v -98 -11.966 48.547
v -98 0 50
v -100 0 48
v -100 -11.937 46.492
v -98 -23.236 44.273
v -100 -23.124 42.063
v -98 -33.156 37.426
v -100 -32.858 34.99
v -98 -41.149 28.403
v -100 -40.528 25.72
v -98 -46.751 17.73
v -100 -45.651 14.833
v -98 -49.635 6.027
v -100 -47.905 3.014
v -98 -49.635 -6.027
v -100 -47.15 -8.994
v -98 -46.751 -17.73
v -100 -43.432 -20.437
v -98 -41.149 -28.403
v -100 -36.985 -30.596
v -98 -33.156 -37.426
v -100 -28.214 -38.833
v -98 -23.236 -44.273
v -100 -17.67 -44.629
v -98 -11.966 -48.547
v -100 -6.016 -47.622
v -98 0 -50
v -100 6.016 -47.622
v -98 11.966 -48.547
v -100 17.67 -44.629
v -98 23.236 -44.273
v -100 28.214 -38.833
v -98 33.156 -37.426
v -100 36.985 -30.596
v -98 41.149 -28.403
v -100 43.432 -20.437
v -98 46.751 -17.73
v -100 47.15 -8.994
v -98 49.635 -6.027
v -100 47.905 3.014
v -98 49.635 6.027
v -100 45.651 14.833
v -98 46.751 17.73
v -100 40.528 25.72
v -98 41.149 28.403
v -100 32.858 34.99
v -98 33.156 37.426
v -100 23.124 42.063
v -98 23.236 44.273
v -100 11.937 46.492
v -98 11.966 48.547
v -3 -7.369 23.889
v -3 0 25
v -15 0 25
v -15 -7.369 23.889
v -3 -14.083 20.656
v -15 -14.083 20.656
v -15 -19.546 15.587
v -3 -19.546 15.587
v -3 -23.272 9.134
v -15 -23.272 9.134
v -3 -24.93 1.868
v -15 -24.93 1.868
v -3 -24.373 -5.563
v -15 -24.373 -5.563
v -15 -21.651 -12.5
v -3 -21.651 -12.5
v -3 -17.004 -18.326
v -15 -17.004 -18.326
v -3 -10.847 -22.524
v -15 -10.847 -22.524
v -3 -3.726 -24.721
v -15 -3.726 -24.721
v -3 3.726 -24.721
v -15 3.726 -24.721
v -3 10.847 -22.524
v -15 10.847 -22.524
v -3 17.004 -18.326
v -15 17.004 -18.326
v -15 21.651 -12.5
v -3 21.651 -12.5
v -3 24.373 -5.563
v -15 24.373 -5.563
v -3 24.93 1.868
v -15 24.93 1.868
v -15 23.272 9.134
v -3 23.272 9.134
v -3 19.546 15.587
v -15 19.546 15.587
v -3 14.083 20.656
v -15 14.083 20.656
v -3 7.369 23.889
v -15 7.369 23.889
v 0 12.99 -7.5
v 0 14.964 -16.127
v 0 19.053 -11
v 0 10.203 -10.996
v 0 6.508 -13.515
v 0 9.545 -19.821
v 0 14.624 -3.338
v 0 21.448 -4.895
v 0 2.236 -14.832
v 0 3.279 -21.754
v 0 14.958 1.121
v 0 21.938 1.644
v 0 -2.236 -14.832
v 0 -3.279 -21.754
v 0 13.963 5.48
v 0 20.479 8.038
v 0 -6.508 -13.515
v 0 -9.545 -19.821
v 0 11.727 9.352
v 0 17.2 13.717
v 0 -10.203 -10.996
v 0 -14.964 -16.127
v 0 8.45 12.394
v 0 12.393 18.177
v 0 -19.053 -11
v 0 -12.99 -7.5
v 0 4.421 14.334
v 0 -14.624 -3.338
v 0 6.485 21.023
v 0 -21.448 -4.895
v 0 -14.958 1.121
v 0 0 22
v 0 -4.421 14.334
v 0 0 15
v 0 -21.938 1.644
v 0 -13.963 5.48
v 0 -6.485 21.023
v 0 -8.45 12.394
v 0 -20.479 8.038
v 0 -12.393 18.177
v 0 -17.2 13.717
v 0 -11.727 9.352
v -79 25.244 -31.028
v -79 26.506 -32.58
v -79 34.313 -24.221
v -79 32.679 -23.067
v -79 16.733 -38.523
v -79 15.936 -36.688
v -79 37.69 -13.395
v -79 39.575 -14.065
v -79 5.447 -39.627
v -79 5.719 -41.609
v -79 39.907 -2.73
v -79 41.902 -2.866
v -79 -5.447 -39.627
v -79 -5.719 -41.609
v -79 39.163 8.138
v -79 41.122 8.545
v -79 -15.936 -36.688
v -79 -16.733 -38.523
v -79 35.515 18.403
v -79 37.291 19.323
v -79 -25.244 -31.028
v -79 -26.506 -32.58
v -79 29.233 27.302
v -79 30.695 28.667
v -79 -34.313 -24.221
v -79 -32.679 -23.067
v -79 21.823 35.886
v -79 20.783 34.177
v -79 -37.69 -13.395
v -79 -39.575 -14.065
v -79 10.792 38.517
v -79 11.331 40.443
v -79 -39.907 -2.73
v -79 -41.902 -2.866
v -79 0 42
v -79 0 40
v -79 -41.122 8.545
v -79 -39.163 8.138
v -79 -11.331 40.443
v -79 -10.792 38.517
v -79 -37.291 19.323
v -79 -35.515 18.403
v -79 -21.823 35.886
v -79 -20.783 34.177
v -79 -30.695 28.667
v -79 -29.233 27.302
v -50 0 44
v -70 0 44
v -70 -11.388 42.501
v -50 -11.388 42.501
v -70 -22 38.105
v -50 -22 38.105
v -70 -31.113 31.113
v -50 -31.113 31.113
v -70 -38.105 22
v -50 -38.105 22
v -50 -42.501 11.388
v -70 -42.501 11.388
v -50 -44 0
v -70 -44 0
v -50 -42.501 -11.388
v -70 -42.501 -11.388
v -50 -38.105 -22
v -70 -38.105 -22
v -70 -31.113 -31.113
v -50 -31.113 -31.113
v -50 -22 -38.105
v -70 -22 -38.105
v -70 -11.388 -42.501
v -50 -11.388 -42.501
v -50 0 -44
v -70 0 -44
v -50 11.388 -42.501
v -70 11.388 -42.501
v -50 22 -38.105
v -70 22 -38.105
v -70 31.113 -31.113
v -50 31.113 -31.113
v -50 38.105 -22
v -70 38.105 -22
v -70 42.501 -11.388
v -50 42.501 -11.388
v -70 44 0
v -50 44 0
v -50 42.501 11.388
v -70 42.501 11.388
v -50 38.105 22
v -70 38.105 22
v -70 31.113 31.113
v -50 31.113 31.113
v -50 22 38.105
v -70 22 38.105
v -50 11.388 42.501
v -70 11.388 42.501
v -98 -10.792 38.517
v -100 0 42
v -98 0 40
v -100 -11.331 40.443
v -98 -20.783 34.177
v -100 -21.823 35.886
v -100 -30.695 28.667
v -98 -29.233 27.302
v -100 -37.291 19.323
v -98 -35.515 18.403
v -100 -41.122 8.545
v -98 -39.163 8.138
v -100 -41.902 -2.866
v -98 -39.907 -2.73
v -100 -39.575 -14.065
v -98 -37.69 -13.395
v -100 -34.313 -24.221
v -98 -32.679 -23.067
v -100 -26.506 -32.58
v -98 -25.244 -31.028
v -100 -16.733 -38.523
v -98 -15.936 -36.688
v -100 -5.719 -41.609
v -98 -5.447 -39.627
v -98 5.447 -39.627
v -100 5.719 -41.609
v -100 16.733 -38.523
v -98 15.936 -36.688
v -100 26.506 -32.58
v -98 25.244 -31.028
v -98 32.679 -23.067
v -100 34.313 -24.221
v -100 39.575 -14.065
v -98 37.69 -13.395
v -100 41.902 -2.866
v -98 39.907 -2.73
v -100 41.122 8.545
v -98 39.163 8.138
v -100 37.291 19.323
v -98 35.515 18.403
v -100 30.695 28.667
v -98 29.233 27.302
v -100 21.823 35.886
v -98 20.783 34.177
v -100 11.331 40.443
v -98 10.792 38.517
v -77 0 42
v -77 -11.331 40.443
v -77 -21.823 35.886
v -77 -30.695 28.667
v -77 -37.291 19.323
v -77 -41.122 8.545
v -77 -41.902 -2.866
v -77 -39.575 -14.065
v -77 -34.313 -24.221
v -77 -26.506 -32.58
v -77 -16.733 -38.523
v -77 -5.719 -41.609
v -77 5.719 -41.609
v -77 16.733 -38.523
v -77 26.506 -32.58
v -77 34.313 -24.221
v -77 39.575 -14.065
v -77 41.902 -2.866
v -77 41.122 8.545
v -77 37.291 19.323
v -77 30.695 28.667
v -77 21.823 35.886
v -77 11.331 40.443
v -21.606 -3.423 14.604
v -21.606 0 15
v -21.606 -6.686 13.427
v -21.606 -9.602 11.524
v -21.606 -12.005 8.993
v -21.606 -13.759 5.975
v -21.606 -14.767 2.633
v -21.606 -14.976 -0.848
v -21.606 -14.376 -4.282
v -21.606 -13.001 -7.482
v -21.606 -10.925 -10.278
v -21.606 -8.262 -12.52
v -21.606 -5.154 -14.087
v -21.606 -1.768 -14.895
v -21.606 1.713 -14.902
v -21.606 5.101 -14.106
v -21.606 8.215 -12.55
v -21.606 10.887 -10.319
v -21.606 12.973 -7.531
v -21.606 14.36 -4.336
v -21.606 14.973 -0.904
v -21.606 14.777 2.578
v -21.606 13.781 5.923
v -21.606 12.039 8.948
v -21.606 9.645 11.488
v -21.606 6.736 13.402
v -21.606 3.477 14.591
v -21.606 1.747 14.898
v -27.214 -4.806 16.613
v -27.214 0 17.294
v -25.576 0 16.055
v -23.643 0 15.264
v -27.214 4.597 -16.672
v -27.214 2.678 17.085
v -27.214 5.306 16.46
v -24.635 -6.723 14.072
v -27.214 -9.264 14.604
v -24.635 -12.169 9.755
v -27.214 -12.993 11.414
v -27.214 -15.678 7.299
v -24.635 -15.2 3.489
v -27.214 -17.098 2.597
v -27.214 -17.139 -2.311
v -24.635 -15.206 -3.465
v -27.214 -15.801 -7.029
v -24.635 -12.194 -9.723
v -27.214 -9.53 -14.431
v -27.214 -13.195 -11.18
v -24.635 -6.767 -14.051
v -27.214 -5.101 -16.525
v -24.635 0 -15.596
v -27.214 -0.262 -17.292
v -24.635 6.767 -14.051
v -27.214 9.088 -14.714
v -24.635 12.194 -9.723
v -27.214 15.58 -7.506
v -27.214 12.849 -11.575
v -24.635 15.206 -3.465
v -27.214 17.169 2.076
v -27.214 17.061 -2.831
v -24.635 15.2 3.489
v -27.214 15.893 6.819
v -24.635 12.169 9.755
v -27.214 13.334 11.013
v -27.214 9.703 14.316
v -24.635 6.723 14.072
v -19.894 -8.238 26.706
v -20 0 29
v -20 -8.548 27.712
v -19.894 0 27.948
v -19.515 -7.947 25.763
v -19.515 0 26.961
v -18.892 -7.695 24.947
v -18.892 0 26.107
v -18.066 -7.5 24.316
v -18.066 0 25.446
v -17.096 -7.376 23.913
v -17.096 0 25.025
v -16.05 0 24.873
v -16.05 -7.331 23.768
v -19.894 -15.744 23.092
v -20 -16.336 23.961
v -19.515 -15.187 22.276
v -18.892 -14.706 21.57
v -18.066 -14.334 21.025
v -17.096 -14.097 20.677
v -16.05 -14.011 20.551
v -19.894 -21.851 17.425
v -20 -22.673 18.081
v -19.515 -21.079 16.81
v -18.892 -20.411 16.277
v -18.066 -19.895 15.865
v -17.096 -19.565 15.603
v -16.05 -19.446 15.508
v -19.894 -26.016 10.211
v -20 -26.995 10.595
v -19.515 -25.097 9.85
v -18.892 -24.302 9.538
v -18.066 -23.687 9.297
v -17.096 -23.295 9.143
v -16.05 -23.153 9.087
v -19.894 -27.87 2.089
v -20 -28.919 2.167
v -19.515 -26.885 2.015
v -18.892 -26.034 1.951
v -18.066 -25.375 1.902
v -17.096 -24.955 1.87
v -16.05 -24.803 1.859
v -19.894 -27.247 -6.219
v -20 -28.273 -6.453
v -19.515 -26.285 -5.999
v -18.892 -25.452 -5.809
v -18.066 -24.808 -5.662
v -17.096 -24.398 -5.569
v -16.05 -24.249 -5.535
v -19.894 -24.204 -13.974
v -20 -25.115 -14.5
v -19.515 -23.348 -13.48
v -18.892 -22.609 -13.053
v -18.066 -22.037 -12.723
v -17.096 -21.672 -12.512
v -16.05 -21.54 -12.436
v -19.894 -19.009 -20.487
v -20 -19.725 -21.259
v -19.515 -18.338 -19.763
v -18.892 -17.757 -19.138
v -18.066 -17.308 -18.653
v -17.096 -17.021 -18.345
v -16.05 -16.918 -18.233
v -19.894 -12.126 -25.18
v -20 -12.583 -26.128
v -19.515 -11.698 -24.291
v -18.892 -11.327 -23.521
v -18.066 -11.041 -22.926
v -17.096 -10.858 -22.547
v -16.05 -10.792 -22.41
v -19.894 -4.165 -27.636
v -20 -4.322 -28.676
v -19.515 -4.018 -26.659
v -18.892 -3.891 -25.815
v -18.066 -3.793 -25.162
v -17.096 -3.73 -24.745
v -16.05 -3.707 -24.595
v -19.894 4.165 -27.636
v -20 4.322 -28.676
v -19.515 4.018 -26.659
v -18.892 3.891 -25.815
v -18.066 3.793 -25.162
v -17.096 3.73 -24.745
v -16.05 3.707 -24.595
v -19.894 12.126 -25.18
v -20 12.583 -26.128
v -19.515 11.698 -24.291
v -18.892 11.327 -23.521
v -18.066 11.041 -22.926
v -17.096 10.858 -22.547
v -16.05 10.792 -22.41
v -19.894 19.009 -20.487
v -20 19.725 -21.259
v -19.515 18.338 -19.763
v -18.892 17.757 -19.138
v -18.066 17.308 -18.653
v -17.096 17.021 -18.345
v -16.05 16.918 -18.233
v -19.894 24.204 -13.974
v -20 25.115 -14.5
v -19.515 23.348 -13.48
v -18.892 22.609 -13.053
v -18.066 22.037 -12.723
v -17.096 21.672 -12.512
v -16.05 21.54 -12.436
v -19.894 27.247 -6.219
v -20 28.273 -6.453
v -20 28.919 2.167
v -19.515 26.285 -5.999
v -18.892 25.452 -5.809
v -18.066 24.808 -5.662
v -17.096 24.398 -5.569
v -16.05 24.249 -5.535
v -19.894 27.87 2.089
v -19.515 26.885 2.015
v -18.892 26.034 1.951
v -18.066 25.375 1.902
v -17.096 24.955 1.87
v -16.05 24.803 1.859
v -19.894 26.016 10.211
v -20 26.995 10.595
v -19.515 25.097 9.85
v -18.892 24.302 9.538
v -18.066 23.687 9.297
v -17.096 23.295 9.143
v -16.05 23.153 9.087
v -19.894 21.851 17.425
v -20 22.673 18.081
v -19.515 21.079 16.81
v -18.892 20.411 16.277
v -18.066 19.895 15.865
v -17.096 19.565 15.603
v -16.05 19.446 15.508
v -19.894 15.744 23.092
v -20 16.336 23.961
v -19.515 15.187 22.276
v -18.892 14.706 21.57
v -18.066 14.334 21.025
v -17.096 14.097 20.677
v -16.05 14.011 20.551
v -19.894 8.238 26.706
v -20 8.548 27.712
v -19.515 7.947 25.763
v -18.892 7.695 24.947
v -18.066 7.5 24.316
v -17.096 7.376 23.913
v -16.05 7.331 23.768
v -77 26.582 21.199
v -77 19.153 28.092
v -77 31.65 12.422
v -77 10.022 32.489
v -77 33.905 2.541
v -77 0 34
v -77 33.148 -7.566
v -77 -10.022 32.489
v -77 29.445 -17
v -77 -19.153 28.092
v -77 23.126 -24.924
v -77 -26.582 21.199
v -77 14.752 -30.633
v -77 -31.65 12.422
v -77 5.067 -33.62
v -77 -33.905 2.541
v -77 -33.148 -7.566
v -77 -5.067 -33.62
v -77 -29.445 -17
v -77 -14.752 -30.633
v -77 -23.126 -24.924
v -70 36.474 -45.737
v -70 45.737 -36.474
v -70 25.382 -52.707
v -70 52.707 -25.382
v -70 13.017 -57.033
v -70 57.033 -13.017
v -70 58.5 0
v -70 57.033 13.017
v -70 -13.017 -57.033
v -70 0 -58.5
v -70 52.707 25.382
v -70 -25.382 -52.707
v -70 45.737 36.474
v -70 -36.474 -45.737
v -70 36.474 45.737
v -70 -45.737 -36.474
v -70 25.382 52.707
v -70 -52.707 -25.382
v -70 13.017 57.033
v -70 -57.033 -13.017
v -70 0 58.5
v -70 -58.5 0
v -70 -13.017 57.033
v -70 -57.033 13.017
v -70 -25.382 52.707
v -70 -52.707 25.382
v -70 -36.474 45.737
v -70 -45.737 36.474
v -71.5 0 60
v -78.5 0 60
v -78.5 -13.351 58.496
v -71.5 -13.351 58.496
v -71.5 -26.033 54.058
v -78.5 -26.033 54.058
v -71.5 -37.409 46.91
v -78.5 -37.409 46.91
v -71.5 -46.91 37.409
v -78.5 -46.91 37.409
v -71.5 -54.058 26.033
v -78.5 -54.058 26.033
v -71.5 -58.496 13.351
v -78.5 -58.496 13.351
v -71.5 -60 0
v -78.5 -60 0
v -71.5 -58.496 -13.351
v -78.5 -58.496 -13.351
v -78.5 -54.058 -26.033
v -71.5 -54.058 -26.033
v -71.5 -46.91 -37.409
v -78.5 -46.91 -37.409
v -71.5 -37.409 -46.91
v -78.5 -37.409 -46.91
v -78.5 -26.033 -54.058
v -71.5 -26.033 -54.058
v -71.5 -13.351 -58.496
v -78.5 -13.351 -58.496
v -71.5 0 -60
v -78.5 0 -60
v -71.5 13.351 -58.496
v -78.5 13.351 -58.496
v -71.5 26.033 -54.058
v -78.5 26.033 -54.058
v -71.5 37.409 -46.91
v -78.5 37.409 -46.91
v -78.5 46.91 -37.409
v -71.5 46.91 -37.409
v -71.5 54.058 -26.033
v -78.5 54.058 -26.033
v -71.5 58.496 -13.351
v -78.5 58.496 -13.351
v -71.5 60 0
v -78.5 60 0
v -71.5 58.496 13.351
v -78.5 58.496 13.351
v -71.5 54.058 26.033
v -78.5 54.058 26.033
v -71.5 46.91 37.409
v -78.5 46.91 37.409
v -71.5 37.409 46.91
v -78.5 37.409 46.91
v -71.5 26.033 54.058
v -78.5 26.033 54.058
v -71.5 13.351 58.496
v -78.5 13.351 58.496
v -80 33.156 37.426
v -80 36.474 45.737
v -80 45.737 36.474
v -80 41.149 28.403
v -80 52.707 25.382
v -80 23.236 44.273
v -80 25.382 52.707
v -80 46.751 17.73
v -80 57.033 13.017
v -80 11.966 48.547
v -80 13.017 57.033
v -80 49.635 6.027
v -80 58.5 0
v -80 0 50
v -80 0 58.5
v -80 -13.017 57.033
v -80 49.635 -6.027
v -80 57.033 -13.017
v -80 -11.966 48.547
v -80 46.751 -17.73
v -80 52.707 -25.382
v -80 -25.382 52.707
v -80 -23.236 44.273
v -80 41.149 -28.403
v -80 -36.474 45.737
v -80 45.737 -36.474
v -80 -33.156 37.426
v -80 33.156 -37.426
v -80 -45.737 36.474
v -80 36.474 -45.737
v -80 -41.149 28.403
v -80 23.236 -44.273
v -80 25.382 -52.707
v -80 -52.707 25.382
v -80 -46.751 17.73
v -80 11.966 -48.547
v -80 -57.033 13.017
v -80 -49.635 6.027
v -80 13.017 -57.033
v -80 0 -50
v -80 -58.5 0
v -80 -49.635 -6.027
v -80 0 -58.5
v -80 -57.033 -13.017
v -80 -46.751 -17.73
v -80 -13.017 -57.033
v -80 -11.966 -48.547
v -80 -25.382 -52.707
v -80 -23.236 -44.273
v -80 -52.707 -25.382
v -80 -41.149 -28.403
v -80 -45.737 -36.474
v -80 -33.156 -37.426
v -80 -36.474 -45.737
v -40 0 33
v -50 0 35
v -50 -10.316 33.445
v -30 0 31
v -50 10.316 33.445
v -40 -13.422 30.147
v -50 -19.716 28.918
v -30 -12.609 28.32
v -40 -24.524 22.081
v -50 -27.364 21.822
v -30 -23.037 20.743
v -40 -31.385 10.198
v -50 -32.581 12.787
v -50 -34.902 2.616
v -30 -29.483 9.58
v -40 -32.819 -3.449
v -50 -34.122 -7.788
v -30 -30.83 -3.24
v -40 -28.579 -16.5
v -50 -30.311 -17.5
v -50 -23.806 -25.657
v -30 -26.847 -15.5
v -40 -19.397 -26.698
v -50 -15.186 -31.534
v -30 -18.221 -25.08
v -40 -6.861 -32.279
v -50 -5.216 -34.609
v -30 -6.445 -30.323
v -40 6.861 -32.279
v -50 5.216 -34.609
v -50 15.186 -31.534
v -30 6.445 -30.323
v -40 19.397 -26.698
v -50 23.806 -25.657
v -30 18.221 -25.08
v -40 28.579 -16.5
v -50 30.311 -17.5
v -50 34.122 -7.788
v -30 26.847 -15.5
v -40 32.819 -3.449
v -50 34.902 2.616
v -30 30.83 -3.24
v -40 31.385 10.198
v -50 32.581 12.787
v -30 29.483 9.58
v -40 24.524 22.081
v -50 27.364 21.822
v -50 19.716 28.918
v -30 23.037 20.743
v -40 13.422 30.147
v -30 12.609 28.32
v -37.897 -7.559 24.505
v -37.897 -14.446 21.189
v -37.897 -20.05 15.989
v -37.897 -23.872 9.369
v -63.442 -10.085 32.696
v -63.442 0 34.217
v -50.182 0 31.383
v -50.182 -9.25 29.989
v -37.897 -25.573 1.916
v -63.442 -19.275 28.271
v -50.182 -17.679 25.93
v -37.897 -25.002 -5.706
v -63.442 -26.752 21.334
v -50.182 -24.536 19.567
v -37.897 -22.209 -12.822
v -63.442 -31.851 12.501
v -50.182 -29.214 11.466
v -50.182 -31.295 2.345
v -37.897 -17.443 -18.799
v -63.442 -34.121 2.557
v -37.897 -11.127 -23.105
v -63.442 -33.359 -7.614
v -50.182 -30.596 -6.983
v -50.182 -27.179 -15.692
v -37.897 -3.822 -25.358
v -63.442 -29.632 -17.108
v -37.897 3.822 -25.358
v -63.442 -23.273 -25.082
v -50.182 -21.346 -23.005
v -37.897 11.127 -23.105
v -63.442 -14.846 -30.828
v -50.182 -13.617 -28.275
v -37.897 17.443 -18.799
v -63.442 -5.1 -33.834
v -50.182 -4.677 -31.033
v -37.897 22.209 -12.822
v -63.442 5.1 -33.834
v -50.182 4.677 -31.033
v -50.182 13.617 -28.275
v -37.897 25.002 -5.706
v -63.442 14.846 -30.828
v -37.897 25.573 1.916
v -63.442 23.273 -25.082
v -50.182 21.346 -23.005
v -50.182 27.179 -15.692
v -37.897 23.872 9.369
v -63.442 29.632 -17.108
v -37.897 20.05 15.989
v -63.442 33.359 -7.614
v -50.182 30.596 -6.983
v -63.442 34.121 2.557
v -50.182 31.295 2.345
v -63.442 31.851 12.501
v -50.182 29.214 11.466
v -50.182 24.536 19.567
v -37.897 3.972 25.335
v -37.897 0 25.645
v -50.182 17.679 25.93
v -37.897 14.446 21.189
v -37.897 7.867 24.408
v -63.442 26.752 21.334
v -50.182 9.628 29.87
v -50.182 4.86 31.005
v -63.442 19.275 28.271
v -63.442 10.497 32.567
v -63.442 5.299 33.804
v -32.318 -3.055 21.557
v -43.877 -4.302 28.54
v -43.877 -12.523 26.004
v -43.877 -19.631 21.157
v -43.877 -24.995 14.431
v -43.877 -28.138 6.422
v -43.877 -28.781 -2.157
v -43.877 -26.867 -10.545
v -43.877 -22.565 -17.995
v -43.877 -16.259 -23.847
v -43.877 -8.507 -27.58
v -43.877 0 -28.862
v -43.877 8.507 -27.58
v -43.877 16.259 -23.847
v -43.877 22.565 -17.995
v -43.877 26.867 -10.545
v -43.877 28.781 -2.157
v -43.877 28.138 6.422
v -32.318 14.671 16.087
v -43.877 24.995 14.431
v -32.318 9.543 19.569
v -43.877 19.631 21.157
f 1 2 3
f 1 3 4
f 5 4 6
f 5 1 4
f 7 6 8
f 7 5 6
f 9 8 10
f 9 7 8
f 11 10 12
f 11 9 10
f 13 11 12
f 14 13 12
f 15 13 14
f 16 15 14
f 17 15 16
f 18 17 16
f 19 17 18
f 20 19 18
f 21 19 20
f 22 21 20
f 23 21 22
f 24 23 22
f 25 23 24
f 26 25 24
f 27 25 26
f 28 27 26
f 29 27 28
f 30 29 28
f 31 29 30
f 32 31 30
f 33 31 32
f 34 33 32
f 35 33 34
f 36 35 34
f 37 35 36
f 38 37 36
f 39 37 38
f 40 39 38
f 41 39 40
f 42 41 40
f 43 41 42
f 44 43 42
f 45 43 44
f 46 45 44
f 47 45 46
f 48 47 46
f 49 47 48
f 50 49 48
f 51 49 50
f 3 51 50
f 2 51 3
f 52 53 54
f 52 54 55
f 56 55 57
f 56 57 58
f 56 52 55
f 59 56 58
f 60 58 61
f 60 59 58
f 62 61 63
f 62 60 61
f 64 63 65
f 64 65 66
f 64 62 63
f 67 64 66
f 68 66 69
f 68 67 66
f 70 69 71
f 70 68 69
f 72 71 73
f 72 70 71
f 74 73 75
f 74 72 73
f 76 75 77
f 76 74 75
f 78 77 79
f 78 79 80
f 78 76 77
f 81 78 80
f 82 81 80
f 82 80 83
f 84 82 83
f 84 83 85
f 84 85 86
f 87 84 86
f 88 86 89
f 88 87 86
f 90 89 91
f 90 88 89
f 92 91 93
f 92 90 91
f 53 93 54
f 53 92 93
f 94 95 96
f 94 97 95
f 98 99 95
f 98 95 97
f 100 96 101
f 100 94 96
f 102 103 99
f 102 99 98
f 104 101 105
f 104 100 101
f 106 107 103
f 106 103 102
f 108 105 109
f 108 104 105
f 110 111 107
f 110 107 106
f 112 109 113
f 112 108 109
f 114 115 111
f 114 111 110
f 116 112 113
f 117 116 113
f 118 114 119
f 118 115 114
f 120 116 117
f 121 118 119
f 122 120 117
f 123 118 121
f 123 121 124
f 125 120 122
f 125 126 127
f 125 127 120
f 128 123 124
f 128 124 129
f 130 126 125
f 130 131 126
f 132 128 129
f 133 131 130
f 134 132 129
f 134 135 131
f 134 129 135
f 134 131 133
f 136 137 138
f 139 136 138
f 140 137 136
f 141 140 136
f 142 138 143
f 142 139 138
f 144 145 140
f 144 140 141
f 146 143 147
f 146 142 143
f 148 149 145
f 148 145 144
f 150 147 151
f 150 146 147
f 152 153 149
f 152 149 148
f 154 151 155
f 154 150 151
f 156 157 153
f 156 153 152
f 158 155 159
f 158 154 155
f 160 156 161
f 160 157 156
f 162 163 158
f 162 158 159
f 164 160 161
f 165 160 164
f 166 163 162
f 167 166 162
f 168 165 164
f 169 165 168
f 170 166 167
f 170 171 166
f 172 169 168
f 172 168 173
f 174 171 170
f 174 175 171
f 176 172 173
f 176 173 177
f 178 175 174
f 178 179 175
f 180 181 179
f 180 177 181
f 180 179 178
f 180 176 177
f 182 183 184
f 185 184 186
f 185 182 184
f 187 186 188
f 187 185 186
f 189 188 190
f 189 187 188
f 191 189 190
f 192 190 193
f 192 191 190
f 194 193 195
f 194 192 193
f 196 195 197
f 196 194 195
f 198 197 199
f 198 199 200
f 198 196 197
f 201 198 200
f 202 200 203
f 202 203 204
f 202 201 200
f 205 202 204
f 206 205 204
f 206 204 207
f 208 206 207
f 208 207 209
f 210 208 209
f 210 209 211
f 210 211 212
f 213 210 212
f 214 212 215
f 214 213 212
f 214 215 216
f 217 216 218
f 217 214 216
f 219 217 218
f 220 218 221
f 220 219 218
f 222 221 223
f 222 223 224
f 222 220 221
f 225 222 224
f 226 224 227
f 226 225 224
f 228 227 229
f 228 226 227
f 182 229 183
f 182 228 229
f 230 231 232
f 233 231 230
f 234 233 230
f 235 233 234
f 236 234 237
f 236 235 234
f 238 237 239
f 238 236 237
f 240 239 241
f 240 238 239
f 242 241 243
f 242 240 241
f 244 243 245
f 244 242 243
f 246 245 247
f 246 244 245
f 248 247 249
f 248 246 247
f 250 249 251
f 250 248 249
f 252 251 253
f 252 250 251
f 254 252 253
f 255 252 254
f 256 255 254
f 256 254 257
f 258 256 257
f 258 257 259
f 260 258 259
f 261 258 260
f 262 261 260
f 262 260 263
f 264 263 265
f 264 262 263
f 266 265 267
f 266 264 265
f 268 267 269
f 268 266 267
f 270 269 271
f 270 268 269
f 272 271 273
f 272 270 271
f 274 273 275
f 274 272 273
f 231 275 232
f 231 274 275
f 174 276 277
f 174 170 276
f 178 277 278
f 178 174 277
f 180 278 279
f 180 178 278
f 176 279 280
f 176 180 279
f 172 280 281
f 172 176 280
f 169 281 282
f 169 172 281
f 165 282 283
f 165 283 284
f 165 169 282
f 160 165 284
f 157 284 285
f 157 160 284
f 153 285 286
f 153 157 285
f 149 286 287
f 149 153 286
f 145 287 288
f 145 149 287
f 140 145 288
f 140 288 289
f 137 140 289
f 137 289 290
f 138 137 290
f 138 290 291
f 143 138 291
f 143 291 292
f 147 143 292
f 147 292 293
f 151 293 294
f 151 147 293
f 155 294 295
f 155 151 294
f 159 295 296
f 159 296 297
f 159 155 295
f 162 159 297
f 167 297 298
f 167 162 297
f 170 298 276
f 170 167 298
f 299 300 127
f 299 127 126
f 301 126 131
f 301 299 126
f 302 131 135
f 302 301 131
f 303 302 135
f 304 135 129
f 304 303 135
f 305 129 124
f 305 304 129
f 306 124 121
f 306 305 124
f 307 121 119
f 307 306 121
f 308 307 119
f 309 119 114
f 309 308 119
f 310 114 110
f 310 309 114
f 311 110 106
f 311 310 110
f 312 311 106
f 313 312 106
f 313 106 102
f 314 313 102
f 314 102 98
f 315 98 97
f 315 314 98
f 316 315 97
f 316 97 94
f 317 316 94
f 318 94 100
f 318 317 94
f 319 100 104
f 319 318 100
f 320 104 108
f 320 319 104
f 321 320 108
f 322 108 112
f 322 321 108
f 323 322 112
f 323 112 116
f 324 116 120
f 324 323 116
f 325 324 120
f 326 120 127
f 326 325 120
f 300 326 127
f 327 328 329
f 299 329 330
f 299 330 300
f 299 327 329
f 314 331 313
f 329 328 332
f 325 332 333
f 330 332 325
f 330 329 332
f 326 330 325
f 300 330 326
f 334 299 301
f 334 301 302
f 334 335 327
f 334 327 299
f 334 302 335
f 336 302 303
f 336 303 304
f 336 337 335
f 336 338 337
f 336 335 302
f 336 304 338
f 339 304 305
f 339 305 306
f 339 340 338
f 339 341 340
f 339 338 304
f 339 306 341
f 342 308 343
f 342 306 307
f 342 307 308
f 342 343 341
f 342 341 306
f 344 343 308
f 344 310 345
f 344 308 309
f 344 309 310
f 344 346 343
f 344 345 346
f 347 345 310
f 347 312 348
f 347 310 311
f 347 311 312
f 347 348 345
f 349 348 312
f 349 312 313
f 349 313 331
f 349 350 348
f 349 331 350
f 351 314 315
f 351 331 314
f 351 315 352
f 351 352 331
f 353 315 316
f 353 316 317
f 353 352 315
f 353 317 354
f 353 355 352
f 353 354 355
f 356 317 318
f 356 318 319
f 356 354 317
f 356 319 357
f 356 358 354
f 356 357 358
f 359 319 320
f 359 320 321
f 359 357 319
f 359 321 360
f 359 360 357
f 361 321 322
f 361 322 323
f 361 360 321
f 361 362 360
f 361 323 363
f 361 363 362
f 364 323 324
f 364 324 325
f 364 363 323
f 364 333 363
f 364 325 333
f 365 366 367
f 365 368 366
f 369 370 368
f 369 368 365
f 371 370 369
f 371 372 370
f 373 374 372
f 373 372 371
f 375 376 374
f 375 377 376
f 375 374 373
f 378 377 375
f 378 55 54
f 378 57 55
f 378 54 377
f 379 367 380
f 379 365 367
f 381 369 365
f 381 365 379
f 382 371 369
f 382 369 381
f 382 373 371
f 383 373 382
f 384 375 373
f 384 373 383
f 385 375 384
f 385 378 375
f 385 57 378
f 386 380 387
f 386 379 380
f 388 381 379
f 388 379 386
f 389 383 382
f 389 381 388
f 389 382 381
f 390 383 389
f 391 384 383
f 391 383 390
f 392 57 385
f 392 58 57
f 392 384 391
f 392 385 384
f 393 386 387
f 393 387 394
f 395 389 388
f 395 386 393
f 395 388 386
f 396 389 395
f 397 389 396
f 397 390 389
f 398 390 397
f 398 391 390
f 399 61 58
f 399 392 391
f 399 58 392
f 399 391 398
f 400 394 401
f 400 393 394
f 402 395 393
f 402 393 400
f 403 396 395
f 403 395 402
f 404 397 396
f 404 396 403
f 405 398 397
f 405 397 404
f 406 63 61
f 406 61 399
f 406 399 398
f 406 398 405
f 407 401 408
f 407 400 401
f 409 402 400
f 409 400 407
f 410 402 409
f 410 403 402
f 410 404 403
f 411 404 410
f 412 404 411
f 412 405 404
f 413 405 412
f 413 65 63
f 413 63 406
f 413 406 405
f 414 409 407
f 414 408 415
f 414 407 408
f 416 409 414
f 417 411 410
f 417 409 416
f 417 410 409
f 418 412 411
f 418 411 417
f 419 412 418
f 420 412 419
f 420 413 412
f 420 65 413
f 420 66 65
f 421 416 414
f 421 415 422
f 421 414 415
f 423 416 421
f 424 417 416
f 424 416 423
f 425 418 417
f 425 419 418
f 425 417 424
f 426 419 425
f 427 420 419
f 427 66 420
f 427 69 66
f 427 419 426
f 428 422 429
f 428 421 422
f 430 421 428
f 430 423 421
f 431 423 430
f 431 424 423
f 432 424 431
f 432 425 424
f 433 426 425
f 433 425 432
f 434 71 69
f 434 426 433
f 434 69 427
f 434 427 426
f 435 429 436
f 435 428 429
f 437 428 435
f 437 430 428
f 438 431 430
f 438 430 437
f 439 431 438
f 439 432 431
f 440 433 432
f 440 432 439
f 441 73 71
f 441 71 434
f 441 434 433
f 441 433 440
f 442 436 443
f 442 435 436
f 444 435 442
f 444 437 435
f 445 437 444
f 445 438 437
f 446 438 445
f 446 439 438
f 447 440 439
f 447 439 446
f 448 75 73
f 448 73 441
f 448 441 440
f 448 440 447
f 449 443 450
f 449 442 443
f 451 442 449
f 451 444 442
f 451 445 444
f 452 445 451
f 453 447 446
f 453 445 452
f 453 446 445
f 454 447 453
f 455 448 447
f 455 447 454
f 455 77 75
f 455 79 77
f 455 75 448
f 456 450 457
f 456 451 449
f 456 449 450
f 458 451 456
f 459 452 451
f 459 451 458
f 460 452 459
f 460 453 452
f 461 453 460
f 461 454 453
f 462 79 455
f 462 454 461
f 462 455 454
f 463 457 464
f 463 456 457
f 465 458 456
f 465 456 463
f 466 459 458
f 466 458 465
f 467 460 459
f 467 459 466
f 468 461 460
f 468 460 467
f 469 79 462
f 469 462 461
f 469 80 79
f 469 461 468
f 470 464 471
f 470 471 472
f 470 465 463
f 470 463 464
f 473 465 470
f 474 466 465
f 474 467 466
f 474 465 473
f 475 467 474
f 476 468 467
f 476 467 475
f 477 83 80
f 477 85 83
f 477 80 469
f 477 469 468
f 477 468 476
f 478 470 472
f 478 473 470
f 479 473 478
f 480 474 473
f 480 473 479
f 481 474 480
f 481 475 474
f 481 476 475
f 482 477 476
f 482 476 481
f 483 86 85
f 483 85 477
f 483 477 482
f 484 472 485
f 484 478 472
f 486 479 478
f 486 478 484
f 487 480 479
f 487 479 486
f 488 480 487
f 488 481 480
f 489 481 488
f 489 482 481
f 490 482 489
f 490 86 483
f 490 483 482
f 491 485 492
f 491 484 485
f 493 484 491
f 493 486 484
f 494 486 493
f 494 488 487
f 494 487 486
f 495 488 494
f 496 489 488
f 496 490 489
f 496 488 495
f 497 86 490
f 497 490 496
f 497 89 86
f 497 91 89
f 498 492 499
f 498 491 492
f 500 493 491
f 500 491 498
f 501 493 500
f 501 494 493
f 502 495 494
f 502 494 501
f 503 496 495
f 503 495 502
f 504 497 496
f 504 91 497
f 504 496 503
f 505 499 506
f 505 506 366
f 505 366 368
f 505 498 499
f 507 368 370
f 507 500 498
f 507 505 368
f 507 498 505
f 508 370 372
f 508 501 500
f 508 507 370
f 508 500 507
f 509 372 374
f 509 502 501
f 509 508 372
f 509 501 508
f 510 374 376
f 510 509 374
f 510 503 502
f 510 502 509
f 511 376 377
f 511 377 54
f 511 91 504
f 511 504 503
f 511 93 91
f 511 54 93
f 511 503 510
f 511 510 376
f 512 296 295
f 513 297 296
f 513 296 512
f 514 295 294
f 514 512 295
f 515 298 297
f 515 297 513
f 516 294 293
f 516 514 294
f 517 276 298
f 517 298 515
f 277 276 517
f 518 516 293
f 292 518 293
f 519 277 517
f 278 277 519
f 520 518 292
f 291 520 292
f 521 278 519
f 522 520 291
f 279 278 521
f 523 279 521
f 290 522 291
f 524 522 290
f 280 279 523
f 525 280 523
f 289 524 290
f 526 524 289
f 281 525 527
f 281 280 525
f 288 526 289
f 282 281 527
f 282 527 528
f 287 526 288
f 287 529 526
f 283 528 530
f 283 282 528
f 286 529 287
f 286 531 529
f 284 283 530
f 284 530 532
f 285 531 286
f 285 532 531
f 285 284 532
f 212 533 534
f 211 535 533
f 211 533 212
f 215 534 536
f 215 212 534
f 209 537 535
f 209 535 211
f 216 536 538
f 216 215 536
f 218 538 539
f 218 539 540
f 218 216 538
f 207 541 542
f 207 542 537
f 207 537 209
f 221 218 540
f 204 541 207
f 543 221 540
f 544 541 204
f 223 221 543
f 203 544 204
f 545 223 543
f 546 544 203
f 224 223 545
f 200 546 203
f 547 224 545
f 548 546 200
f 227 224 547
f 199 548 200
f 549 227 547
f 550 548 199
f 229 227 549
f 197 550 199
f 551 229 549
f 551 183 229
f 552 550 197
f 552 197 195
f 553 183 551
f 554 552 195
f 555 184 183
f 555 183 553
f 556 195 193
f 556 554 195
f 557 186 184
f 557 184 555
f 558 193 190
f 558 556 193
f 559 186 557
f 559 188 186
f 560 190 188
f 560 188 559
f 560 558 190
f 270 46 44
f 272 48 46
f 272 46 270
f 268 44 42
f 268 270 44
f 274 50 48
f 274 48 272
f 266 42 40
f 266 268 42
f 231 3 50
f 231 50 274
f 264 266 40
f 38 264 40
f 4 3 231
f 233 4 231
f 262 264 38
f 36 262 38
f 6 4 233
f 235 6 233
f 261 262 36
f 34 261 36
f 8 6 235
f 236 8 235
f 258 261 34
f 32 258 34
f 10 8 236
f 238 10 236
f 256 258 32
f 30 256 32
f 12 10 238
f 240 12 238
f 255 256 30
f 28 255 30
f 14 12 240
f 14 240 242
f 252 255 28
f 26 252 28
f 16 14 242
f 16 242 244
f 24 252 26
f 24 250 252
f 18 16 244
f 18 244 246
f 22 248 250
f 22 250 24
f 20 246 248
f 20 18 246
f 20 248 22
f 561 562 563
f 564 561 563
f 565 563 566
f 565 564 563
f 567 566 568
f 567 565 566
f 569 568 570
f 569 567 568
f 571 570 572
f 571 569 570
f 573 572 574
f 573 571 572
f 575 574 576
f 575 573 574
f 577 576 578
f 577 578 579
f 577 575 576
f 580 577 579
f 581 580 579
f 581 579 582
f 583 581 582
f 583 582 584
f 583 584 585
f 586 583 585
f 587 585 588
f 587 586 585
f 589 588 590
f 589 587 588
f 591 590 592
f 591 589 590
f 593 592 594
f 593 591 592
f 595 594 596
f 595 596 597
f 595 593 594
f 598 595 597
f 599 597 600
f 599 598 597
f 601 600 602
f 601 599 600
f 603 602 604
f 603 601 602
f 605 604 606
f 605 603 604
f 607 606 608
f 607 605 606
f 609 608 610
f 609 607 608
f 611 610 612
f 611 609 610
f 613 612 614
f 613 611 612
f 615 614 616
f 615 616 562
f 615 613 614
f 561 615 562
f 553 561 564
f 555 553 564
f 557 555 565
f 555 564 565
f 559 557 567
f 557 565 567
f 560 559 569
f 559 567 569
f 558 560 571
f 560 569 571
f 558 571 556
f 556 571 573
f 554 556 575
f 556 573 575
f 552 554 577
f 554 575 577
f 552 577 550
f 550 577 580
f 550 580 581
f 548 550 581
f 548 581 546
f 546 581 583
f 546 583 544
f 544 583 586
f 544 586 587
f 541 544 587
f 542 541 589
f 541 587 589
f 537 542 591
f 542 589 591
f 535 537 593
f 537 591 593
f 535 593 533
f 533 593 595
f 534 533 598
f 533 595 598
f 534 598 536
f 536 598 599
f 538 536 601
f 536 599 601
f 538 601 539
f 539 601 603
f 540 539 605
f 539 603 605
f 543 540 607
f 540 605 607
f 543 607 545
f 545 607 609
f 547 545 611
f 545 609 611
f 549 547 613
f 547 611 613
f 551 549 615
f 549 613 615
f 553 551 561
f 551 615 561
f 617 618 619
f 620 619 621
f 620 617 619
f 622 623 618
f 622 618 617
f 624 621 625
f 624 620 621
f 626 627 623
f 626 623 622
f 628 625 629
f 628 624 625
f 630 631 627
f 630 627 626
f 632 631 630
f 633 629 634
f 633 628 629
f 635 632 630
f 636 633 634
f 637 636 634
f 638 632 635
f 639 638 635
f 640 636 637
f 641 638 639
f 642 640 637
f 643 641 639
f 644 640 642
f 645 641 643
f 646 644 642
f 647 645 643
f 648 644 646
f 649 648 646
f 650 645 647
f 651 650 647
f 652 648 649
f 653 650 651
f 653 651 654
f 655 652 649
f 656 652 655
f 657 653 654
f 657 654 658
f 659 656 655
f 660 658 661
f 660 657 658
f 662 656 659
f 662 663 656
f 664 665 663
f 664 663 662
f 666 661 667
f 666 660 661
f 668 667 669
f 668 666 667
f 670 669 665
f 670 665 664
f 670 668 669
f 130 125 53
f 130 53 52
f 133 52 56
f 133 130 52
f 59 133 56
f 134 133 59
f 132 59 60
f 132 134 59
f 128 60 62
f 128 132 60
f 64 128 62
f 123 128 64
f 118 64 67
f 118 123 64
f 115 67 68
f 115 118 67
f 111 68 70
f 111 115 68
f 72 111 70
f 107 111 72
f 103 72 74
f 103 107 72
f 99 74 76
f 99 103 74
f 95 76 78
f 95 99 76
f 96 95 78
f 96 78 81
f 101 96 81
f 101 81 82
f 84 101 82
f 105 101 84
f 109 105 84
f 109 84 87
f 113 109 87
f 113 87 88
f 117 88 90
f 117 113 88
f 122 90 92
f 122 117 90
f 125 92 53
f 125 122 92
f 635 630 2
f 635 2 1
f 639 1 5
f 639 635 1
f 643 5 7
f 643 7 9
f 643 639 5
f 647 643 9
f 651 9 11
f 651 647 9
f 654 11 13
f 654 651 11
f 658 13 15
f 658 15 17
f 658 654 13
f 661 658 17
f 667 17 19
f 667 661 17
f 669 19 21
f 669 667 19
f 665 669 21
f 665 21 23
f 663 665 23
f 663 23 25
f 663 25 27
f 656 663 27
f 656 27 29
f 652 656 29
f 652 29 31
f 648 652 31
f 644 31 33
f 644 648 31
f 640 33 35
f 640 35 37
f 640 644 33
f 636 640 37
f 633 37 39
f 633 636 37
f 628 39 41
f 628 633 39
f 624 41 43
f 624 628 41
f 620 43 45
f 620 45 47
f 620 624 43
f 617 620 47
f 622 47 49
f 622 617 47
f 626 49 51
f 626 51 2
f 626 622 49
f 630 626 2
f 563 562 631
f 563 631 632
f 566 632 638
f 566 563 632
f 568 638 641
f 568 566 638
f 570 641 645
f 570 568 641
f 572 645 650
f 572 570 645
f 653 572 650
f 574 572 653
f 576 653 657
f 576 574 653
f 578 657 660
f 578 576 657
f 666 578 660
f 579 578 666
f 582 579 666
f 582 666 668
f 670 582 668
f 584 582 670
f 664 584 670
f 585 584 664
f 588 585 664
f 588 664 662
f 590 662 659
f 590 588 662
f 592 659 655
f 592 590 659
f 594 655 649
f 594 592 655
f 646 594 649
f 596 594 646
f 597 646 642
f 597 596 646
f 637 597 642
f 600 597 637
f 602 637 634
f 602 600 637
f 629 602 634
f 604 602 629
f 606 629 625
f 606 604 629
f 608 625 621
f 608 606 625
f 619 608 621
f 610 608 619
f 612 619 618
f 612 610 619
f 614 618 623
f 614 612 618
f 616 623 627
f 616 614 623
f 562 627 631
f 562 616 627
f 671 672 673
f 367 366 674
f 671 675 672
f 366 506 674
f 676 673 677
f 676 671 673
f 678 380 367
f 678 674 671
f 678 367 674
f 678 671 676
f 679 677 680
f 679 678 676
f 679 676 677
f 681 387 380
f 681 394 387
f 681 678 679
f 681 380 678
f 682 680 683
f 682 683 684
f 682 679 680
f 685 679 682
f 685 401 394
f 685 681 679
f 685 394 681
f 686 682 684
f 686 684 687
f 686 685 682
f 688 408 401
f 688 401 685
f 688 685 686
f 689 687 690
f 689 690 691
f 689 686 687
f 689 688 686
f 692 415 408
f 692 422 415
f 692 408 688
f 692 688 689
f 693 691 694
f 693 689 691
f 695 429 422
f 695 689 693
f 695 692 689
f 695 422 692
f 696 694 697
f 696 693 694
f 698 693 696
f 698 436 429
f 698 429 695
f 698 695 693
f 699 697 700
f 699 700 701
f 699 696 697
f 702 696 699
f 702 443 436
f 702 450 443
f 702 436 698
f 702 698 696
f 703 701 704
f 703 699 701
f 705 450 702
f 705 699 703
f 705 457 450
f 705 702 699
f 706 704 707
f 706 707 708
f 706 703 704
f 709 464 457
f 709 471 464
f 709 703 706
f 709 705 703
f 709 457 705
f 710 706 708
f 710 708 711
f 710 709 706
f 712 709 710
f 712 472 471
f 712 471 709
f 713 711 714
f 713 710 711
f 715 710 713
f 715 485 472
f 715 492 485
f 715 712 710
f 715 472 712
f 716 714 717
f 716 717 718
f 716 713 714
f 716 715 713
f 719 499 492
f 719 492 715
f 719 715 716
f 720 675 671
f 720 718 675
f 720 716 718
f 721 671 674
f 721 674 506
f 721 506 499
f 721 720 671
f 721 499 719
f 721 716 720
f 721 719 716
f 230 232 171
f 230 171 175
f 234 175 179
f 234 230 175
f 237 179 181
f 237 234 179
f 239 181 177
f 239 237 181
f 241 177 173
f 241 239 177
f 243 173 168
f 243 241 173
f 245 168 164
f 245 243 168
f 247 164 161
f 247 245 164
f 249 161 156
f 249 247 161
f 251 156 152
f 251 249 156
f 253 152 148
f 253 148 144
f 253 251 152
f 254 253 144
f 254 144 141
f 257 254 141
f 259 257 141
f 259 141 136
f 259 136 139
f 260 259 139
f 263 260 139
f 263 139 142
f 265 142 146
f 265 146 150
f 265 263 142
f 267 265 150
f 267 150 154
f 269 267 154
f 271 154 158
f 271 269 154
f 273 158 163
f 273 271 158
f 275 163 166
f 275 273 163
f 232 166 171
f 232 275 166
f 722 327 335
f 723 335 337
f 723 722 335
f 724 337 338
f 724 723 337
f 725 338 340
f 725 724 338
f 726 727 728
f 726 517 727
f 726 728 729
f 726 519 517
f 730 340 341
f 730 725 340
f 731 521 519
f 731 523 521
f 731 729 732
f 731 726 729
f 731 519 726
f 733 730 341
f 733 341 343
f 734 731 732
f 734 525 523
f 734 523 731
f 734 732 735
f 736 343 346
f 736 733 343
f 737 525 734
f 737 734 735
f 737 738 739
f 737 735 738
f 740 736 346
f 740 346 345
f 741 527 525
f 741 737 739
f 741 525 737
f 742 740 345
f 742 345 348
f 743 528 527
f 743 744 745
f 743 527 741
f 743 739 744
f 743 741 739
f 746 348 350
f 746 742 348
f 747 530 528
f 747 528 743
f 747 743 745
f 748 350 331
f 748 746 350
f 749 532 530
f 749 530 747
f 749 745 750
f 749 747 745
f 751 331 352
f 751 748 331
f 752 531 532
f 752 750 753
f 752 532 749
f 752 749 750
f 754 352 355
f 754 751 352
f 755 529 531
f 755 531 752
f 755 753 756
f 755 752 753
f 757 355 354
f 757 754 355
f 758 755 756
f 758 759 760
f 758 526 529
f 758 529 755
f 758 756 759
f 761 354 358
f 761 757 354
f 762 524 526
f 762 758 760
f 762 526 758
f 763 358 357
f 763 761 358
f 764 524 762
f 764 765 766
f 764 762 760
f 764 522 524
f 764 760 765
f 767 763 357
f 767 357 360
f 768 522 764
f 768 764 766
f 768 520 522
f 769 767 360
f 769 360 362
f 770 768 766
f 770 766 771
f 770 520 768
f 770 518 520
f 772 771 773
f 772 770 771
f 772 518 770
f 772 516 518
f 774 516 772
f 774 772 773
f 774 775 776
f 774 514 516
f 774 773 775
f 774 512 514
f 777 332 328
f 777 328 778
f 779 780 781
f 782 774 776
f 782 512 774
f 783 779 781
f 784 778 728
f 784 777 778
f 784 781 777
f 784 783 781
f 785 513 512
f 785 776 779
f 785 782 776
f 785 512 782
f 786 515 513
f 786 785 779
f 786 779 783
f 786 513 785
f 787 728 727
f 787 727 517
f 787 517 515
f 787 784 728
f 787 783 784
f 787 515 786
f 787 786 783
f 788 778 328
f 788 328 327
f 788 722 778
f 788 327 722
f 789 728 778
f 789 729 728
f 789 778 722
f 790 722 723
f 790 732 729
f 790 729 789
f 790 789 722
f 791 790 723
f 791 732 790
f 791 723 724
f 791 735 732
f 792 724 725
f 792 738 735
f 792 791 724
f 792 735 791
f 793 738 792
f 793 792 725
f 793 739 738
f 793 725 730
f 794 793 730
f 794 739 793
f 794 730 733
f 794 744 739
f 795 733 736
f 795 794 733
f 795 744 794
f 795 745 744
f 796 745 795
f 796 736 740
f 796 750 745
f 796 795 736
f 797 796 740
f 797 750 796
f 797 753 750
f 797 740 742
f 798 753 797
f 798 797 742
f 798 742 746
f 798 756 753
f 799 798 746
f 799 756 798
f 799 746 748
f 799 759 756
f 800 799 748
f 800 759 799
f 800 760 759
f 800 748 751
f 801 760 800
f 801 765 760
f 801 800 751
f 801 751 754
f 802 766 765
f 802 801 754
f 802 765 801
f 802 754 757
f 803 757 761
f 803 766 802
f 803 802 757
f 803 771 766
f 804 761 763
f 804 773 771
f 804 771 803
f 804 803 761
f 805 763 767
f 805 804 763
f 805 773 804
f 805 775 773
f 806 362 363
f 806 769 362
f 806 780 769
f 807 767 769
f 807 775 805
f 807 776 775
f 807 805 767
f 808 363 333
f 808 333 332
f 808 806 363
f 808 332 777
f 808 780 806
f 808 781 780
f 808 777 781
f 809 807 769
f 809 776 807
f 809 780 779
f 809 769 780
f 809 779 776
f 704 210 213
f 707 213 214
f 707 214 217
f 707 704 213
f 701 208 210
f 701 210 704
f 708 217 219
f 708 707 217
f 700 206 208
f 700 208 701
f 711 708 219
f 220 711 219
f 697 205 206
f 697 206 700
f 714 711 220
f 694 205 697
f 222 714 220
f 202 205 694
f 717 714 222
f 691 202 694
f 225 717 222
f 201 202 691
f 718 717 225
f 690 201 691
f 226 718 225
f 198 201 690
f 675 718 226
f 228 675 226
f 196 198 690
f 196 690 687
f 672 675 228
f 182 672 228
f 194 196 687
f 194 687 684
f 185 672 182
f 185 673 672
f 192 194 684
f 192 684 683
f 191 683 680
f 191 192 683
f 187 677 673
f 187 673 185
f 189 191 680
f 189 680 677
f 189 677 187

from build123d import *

# Parameters (mm, degrees)
SMUSSO1_SIZE = 2
RACCORDO1_R  = 8
SMUSSO2_SIZE = 1.5
SMUSSO3_SIZE = 3


with BuildPart() as part:
    # Schizzo1 → Rivoluzione1 (revolve)
    with BuildSketch(Plane.XY, mode=Mode.PRIVATE) as rivoluzione1_sk:
        with BuildLine():
            ThreePointArc((-25, 15), (-48.677605909, 30.856025933), (-77, 34))
            Line((-77, 34), (-77, 42))
            Line((-77, 42), (-79, 42))
            Line((-79, 42), (-79, 40))
            Line((-79, 40), (-100, 40))
            Line((-100, 40), (-100, 50))
            Line((-100, 50), (-80, 50))
            Line((-80, 50), (-80, 60))
            Line((-80, 60), (-70, 60))
            Line((-70, 60), (-70, 44))
            Line((-70, 44), (-50, 44))
            Line((-50, 44), (-50, 35))
            Line((-50, 35), (-20, 29))
            ThreePointArc((-20, 29), (-18.500814089, 25.748982388), (-15, 25))
            Line((-15, 25), (0, 25))
            Line((0, 25), (0, 15))
            Line((0, 15), (-25, 15))
        make_face()
    revolve(rivoluzione1_sk.sketch.rotate(Axis((-117.125626325, 0, 0), (1, 0, 0)), 90), axis=Axis((-117.125626325, 0, 0), (1, 0, 0)))

    # Smusso1
    smusso1_edges = [part.edges().sort_by_distance(p)[0] for p in [
        (-100, 0, -40),
        (-100, 0, -50),
    ]]
    chamfer(smusso1_edges, length=SMUSSO1_SIZE)

    # Raccordo1
    raccordo1_edges = [part.edges().sort_by_distance(p)[0] for p in [
        (-25, 0, -15),
    ]]
    fillet(raccordo1_edges, radius=RACCORDO1_R)

    # Smusso2
    smusso2_edges = [part.edges().sort_by_distance(p)[0] for p in [
        (-80, 0, -60),
        (-70, 0, -60),
    ]]
    chamfer(smusso2_edges, length=SMUSSO2_SIZE)

    # Smusso3
    smusso3_edges = [part.edges().sort_by_distance(p)[0] for p in [
        (0, 0, -25),
    ]]
    chamfer(smusso3_edges, length=SMUSSO3_SIZE)


solid = part.part
